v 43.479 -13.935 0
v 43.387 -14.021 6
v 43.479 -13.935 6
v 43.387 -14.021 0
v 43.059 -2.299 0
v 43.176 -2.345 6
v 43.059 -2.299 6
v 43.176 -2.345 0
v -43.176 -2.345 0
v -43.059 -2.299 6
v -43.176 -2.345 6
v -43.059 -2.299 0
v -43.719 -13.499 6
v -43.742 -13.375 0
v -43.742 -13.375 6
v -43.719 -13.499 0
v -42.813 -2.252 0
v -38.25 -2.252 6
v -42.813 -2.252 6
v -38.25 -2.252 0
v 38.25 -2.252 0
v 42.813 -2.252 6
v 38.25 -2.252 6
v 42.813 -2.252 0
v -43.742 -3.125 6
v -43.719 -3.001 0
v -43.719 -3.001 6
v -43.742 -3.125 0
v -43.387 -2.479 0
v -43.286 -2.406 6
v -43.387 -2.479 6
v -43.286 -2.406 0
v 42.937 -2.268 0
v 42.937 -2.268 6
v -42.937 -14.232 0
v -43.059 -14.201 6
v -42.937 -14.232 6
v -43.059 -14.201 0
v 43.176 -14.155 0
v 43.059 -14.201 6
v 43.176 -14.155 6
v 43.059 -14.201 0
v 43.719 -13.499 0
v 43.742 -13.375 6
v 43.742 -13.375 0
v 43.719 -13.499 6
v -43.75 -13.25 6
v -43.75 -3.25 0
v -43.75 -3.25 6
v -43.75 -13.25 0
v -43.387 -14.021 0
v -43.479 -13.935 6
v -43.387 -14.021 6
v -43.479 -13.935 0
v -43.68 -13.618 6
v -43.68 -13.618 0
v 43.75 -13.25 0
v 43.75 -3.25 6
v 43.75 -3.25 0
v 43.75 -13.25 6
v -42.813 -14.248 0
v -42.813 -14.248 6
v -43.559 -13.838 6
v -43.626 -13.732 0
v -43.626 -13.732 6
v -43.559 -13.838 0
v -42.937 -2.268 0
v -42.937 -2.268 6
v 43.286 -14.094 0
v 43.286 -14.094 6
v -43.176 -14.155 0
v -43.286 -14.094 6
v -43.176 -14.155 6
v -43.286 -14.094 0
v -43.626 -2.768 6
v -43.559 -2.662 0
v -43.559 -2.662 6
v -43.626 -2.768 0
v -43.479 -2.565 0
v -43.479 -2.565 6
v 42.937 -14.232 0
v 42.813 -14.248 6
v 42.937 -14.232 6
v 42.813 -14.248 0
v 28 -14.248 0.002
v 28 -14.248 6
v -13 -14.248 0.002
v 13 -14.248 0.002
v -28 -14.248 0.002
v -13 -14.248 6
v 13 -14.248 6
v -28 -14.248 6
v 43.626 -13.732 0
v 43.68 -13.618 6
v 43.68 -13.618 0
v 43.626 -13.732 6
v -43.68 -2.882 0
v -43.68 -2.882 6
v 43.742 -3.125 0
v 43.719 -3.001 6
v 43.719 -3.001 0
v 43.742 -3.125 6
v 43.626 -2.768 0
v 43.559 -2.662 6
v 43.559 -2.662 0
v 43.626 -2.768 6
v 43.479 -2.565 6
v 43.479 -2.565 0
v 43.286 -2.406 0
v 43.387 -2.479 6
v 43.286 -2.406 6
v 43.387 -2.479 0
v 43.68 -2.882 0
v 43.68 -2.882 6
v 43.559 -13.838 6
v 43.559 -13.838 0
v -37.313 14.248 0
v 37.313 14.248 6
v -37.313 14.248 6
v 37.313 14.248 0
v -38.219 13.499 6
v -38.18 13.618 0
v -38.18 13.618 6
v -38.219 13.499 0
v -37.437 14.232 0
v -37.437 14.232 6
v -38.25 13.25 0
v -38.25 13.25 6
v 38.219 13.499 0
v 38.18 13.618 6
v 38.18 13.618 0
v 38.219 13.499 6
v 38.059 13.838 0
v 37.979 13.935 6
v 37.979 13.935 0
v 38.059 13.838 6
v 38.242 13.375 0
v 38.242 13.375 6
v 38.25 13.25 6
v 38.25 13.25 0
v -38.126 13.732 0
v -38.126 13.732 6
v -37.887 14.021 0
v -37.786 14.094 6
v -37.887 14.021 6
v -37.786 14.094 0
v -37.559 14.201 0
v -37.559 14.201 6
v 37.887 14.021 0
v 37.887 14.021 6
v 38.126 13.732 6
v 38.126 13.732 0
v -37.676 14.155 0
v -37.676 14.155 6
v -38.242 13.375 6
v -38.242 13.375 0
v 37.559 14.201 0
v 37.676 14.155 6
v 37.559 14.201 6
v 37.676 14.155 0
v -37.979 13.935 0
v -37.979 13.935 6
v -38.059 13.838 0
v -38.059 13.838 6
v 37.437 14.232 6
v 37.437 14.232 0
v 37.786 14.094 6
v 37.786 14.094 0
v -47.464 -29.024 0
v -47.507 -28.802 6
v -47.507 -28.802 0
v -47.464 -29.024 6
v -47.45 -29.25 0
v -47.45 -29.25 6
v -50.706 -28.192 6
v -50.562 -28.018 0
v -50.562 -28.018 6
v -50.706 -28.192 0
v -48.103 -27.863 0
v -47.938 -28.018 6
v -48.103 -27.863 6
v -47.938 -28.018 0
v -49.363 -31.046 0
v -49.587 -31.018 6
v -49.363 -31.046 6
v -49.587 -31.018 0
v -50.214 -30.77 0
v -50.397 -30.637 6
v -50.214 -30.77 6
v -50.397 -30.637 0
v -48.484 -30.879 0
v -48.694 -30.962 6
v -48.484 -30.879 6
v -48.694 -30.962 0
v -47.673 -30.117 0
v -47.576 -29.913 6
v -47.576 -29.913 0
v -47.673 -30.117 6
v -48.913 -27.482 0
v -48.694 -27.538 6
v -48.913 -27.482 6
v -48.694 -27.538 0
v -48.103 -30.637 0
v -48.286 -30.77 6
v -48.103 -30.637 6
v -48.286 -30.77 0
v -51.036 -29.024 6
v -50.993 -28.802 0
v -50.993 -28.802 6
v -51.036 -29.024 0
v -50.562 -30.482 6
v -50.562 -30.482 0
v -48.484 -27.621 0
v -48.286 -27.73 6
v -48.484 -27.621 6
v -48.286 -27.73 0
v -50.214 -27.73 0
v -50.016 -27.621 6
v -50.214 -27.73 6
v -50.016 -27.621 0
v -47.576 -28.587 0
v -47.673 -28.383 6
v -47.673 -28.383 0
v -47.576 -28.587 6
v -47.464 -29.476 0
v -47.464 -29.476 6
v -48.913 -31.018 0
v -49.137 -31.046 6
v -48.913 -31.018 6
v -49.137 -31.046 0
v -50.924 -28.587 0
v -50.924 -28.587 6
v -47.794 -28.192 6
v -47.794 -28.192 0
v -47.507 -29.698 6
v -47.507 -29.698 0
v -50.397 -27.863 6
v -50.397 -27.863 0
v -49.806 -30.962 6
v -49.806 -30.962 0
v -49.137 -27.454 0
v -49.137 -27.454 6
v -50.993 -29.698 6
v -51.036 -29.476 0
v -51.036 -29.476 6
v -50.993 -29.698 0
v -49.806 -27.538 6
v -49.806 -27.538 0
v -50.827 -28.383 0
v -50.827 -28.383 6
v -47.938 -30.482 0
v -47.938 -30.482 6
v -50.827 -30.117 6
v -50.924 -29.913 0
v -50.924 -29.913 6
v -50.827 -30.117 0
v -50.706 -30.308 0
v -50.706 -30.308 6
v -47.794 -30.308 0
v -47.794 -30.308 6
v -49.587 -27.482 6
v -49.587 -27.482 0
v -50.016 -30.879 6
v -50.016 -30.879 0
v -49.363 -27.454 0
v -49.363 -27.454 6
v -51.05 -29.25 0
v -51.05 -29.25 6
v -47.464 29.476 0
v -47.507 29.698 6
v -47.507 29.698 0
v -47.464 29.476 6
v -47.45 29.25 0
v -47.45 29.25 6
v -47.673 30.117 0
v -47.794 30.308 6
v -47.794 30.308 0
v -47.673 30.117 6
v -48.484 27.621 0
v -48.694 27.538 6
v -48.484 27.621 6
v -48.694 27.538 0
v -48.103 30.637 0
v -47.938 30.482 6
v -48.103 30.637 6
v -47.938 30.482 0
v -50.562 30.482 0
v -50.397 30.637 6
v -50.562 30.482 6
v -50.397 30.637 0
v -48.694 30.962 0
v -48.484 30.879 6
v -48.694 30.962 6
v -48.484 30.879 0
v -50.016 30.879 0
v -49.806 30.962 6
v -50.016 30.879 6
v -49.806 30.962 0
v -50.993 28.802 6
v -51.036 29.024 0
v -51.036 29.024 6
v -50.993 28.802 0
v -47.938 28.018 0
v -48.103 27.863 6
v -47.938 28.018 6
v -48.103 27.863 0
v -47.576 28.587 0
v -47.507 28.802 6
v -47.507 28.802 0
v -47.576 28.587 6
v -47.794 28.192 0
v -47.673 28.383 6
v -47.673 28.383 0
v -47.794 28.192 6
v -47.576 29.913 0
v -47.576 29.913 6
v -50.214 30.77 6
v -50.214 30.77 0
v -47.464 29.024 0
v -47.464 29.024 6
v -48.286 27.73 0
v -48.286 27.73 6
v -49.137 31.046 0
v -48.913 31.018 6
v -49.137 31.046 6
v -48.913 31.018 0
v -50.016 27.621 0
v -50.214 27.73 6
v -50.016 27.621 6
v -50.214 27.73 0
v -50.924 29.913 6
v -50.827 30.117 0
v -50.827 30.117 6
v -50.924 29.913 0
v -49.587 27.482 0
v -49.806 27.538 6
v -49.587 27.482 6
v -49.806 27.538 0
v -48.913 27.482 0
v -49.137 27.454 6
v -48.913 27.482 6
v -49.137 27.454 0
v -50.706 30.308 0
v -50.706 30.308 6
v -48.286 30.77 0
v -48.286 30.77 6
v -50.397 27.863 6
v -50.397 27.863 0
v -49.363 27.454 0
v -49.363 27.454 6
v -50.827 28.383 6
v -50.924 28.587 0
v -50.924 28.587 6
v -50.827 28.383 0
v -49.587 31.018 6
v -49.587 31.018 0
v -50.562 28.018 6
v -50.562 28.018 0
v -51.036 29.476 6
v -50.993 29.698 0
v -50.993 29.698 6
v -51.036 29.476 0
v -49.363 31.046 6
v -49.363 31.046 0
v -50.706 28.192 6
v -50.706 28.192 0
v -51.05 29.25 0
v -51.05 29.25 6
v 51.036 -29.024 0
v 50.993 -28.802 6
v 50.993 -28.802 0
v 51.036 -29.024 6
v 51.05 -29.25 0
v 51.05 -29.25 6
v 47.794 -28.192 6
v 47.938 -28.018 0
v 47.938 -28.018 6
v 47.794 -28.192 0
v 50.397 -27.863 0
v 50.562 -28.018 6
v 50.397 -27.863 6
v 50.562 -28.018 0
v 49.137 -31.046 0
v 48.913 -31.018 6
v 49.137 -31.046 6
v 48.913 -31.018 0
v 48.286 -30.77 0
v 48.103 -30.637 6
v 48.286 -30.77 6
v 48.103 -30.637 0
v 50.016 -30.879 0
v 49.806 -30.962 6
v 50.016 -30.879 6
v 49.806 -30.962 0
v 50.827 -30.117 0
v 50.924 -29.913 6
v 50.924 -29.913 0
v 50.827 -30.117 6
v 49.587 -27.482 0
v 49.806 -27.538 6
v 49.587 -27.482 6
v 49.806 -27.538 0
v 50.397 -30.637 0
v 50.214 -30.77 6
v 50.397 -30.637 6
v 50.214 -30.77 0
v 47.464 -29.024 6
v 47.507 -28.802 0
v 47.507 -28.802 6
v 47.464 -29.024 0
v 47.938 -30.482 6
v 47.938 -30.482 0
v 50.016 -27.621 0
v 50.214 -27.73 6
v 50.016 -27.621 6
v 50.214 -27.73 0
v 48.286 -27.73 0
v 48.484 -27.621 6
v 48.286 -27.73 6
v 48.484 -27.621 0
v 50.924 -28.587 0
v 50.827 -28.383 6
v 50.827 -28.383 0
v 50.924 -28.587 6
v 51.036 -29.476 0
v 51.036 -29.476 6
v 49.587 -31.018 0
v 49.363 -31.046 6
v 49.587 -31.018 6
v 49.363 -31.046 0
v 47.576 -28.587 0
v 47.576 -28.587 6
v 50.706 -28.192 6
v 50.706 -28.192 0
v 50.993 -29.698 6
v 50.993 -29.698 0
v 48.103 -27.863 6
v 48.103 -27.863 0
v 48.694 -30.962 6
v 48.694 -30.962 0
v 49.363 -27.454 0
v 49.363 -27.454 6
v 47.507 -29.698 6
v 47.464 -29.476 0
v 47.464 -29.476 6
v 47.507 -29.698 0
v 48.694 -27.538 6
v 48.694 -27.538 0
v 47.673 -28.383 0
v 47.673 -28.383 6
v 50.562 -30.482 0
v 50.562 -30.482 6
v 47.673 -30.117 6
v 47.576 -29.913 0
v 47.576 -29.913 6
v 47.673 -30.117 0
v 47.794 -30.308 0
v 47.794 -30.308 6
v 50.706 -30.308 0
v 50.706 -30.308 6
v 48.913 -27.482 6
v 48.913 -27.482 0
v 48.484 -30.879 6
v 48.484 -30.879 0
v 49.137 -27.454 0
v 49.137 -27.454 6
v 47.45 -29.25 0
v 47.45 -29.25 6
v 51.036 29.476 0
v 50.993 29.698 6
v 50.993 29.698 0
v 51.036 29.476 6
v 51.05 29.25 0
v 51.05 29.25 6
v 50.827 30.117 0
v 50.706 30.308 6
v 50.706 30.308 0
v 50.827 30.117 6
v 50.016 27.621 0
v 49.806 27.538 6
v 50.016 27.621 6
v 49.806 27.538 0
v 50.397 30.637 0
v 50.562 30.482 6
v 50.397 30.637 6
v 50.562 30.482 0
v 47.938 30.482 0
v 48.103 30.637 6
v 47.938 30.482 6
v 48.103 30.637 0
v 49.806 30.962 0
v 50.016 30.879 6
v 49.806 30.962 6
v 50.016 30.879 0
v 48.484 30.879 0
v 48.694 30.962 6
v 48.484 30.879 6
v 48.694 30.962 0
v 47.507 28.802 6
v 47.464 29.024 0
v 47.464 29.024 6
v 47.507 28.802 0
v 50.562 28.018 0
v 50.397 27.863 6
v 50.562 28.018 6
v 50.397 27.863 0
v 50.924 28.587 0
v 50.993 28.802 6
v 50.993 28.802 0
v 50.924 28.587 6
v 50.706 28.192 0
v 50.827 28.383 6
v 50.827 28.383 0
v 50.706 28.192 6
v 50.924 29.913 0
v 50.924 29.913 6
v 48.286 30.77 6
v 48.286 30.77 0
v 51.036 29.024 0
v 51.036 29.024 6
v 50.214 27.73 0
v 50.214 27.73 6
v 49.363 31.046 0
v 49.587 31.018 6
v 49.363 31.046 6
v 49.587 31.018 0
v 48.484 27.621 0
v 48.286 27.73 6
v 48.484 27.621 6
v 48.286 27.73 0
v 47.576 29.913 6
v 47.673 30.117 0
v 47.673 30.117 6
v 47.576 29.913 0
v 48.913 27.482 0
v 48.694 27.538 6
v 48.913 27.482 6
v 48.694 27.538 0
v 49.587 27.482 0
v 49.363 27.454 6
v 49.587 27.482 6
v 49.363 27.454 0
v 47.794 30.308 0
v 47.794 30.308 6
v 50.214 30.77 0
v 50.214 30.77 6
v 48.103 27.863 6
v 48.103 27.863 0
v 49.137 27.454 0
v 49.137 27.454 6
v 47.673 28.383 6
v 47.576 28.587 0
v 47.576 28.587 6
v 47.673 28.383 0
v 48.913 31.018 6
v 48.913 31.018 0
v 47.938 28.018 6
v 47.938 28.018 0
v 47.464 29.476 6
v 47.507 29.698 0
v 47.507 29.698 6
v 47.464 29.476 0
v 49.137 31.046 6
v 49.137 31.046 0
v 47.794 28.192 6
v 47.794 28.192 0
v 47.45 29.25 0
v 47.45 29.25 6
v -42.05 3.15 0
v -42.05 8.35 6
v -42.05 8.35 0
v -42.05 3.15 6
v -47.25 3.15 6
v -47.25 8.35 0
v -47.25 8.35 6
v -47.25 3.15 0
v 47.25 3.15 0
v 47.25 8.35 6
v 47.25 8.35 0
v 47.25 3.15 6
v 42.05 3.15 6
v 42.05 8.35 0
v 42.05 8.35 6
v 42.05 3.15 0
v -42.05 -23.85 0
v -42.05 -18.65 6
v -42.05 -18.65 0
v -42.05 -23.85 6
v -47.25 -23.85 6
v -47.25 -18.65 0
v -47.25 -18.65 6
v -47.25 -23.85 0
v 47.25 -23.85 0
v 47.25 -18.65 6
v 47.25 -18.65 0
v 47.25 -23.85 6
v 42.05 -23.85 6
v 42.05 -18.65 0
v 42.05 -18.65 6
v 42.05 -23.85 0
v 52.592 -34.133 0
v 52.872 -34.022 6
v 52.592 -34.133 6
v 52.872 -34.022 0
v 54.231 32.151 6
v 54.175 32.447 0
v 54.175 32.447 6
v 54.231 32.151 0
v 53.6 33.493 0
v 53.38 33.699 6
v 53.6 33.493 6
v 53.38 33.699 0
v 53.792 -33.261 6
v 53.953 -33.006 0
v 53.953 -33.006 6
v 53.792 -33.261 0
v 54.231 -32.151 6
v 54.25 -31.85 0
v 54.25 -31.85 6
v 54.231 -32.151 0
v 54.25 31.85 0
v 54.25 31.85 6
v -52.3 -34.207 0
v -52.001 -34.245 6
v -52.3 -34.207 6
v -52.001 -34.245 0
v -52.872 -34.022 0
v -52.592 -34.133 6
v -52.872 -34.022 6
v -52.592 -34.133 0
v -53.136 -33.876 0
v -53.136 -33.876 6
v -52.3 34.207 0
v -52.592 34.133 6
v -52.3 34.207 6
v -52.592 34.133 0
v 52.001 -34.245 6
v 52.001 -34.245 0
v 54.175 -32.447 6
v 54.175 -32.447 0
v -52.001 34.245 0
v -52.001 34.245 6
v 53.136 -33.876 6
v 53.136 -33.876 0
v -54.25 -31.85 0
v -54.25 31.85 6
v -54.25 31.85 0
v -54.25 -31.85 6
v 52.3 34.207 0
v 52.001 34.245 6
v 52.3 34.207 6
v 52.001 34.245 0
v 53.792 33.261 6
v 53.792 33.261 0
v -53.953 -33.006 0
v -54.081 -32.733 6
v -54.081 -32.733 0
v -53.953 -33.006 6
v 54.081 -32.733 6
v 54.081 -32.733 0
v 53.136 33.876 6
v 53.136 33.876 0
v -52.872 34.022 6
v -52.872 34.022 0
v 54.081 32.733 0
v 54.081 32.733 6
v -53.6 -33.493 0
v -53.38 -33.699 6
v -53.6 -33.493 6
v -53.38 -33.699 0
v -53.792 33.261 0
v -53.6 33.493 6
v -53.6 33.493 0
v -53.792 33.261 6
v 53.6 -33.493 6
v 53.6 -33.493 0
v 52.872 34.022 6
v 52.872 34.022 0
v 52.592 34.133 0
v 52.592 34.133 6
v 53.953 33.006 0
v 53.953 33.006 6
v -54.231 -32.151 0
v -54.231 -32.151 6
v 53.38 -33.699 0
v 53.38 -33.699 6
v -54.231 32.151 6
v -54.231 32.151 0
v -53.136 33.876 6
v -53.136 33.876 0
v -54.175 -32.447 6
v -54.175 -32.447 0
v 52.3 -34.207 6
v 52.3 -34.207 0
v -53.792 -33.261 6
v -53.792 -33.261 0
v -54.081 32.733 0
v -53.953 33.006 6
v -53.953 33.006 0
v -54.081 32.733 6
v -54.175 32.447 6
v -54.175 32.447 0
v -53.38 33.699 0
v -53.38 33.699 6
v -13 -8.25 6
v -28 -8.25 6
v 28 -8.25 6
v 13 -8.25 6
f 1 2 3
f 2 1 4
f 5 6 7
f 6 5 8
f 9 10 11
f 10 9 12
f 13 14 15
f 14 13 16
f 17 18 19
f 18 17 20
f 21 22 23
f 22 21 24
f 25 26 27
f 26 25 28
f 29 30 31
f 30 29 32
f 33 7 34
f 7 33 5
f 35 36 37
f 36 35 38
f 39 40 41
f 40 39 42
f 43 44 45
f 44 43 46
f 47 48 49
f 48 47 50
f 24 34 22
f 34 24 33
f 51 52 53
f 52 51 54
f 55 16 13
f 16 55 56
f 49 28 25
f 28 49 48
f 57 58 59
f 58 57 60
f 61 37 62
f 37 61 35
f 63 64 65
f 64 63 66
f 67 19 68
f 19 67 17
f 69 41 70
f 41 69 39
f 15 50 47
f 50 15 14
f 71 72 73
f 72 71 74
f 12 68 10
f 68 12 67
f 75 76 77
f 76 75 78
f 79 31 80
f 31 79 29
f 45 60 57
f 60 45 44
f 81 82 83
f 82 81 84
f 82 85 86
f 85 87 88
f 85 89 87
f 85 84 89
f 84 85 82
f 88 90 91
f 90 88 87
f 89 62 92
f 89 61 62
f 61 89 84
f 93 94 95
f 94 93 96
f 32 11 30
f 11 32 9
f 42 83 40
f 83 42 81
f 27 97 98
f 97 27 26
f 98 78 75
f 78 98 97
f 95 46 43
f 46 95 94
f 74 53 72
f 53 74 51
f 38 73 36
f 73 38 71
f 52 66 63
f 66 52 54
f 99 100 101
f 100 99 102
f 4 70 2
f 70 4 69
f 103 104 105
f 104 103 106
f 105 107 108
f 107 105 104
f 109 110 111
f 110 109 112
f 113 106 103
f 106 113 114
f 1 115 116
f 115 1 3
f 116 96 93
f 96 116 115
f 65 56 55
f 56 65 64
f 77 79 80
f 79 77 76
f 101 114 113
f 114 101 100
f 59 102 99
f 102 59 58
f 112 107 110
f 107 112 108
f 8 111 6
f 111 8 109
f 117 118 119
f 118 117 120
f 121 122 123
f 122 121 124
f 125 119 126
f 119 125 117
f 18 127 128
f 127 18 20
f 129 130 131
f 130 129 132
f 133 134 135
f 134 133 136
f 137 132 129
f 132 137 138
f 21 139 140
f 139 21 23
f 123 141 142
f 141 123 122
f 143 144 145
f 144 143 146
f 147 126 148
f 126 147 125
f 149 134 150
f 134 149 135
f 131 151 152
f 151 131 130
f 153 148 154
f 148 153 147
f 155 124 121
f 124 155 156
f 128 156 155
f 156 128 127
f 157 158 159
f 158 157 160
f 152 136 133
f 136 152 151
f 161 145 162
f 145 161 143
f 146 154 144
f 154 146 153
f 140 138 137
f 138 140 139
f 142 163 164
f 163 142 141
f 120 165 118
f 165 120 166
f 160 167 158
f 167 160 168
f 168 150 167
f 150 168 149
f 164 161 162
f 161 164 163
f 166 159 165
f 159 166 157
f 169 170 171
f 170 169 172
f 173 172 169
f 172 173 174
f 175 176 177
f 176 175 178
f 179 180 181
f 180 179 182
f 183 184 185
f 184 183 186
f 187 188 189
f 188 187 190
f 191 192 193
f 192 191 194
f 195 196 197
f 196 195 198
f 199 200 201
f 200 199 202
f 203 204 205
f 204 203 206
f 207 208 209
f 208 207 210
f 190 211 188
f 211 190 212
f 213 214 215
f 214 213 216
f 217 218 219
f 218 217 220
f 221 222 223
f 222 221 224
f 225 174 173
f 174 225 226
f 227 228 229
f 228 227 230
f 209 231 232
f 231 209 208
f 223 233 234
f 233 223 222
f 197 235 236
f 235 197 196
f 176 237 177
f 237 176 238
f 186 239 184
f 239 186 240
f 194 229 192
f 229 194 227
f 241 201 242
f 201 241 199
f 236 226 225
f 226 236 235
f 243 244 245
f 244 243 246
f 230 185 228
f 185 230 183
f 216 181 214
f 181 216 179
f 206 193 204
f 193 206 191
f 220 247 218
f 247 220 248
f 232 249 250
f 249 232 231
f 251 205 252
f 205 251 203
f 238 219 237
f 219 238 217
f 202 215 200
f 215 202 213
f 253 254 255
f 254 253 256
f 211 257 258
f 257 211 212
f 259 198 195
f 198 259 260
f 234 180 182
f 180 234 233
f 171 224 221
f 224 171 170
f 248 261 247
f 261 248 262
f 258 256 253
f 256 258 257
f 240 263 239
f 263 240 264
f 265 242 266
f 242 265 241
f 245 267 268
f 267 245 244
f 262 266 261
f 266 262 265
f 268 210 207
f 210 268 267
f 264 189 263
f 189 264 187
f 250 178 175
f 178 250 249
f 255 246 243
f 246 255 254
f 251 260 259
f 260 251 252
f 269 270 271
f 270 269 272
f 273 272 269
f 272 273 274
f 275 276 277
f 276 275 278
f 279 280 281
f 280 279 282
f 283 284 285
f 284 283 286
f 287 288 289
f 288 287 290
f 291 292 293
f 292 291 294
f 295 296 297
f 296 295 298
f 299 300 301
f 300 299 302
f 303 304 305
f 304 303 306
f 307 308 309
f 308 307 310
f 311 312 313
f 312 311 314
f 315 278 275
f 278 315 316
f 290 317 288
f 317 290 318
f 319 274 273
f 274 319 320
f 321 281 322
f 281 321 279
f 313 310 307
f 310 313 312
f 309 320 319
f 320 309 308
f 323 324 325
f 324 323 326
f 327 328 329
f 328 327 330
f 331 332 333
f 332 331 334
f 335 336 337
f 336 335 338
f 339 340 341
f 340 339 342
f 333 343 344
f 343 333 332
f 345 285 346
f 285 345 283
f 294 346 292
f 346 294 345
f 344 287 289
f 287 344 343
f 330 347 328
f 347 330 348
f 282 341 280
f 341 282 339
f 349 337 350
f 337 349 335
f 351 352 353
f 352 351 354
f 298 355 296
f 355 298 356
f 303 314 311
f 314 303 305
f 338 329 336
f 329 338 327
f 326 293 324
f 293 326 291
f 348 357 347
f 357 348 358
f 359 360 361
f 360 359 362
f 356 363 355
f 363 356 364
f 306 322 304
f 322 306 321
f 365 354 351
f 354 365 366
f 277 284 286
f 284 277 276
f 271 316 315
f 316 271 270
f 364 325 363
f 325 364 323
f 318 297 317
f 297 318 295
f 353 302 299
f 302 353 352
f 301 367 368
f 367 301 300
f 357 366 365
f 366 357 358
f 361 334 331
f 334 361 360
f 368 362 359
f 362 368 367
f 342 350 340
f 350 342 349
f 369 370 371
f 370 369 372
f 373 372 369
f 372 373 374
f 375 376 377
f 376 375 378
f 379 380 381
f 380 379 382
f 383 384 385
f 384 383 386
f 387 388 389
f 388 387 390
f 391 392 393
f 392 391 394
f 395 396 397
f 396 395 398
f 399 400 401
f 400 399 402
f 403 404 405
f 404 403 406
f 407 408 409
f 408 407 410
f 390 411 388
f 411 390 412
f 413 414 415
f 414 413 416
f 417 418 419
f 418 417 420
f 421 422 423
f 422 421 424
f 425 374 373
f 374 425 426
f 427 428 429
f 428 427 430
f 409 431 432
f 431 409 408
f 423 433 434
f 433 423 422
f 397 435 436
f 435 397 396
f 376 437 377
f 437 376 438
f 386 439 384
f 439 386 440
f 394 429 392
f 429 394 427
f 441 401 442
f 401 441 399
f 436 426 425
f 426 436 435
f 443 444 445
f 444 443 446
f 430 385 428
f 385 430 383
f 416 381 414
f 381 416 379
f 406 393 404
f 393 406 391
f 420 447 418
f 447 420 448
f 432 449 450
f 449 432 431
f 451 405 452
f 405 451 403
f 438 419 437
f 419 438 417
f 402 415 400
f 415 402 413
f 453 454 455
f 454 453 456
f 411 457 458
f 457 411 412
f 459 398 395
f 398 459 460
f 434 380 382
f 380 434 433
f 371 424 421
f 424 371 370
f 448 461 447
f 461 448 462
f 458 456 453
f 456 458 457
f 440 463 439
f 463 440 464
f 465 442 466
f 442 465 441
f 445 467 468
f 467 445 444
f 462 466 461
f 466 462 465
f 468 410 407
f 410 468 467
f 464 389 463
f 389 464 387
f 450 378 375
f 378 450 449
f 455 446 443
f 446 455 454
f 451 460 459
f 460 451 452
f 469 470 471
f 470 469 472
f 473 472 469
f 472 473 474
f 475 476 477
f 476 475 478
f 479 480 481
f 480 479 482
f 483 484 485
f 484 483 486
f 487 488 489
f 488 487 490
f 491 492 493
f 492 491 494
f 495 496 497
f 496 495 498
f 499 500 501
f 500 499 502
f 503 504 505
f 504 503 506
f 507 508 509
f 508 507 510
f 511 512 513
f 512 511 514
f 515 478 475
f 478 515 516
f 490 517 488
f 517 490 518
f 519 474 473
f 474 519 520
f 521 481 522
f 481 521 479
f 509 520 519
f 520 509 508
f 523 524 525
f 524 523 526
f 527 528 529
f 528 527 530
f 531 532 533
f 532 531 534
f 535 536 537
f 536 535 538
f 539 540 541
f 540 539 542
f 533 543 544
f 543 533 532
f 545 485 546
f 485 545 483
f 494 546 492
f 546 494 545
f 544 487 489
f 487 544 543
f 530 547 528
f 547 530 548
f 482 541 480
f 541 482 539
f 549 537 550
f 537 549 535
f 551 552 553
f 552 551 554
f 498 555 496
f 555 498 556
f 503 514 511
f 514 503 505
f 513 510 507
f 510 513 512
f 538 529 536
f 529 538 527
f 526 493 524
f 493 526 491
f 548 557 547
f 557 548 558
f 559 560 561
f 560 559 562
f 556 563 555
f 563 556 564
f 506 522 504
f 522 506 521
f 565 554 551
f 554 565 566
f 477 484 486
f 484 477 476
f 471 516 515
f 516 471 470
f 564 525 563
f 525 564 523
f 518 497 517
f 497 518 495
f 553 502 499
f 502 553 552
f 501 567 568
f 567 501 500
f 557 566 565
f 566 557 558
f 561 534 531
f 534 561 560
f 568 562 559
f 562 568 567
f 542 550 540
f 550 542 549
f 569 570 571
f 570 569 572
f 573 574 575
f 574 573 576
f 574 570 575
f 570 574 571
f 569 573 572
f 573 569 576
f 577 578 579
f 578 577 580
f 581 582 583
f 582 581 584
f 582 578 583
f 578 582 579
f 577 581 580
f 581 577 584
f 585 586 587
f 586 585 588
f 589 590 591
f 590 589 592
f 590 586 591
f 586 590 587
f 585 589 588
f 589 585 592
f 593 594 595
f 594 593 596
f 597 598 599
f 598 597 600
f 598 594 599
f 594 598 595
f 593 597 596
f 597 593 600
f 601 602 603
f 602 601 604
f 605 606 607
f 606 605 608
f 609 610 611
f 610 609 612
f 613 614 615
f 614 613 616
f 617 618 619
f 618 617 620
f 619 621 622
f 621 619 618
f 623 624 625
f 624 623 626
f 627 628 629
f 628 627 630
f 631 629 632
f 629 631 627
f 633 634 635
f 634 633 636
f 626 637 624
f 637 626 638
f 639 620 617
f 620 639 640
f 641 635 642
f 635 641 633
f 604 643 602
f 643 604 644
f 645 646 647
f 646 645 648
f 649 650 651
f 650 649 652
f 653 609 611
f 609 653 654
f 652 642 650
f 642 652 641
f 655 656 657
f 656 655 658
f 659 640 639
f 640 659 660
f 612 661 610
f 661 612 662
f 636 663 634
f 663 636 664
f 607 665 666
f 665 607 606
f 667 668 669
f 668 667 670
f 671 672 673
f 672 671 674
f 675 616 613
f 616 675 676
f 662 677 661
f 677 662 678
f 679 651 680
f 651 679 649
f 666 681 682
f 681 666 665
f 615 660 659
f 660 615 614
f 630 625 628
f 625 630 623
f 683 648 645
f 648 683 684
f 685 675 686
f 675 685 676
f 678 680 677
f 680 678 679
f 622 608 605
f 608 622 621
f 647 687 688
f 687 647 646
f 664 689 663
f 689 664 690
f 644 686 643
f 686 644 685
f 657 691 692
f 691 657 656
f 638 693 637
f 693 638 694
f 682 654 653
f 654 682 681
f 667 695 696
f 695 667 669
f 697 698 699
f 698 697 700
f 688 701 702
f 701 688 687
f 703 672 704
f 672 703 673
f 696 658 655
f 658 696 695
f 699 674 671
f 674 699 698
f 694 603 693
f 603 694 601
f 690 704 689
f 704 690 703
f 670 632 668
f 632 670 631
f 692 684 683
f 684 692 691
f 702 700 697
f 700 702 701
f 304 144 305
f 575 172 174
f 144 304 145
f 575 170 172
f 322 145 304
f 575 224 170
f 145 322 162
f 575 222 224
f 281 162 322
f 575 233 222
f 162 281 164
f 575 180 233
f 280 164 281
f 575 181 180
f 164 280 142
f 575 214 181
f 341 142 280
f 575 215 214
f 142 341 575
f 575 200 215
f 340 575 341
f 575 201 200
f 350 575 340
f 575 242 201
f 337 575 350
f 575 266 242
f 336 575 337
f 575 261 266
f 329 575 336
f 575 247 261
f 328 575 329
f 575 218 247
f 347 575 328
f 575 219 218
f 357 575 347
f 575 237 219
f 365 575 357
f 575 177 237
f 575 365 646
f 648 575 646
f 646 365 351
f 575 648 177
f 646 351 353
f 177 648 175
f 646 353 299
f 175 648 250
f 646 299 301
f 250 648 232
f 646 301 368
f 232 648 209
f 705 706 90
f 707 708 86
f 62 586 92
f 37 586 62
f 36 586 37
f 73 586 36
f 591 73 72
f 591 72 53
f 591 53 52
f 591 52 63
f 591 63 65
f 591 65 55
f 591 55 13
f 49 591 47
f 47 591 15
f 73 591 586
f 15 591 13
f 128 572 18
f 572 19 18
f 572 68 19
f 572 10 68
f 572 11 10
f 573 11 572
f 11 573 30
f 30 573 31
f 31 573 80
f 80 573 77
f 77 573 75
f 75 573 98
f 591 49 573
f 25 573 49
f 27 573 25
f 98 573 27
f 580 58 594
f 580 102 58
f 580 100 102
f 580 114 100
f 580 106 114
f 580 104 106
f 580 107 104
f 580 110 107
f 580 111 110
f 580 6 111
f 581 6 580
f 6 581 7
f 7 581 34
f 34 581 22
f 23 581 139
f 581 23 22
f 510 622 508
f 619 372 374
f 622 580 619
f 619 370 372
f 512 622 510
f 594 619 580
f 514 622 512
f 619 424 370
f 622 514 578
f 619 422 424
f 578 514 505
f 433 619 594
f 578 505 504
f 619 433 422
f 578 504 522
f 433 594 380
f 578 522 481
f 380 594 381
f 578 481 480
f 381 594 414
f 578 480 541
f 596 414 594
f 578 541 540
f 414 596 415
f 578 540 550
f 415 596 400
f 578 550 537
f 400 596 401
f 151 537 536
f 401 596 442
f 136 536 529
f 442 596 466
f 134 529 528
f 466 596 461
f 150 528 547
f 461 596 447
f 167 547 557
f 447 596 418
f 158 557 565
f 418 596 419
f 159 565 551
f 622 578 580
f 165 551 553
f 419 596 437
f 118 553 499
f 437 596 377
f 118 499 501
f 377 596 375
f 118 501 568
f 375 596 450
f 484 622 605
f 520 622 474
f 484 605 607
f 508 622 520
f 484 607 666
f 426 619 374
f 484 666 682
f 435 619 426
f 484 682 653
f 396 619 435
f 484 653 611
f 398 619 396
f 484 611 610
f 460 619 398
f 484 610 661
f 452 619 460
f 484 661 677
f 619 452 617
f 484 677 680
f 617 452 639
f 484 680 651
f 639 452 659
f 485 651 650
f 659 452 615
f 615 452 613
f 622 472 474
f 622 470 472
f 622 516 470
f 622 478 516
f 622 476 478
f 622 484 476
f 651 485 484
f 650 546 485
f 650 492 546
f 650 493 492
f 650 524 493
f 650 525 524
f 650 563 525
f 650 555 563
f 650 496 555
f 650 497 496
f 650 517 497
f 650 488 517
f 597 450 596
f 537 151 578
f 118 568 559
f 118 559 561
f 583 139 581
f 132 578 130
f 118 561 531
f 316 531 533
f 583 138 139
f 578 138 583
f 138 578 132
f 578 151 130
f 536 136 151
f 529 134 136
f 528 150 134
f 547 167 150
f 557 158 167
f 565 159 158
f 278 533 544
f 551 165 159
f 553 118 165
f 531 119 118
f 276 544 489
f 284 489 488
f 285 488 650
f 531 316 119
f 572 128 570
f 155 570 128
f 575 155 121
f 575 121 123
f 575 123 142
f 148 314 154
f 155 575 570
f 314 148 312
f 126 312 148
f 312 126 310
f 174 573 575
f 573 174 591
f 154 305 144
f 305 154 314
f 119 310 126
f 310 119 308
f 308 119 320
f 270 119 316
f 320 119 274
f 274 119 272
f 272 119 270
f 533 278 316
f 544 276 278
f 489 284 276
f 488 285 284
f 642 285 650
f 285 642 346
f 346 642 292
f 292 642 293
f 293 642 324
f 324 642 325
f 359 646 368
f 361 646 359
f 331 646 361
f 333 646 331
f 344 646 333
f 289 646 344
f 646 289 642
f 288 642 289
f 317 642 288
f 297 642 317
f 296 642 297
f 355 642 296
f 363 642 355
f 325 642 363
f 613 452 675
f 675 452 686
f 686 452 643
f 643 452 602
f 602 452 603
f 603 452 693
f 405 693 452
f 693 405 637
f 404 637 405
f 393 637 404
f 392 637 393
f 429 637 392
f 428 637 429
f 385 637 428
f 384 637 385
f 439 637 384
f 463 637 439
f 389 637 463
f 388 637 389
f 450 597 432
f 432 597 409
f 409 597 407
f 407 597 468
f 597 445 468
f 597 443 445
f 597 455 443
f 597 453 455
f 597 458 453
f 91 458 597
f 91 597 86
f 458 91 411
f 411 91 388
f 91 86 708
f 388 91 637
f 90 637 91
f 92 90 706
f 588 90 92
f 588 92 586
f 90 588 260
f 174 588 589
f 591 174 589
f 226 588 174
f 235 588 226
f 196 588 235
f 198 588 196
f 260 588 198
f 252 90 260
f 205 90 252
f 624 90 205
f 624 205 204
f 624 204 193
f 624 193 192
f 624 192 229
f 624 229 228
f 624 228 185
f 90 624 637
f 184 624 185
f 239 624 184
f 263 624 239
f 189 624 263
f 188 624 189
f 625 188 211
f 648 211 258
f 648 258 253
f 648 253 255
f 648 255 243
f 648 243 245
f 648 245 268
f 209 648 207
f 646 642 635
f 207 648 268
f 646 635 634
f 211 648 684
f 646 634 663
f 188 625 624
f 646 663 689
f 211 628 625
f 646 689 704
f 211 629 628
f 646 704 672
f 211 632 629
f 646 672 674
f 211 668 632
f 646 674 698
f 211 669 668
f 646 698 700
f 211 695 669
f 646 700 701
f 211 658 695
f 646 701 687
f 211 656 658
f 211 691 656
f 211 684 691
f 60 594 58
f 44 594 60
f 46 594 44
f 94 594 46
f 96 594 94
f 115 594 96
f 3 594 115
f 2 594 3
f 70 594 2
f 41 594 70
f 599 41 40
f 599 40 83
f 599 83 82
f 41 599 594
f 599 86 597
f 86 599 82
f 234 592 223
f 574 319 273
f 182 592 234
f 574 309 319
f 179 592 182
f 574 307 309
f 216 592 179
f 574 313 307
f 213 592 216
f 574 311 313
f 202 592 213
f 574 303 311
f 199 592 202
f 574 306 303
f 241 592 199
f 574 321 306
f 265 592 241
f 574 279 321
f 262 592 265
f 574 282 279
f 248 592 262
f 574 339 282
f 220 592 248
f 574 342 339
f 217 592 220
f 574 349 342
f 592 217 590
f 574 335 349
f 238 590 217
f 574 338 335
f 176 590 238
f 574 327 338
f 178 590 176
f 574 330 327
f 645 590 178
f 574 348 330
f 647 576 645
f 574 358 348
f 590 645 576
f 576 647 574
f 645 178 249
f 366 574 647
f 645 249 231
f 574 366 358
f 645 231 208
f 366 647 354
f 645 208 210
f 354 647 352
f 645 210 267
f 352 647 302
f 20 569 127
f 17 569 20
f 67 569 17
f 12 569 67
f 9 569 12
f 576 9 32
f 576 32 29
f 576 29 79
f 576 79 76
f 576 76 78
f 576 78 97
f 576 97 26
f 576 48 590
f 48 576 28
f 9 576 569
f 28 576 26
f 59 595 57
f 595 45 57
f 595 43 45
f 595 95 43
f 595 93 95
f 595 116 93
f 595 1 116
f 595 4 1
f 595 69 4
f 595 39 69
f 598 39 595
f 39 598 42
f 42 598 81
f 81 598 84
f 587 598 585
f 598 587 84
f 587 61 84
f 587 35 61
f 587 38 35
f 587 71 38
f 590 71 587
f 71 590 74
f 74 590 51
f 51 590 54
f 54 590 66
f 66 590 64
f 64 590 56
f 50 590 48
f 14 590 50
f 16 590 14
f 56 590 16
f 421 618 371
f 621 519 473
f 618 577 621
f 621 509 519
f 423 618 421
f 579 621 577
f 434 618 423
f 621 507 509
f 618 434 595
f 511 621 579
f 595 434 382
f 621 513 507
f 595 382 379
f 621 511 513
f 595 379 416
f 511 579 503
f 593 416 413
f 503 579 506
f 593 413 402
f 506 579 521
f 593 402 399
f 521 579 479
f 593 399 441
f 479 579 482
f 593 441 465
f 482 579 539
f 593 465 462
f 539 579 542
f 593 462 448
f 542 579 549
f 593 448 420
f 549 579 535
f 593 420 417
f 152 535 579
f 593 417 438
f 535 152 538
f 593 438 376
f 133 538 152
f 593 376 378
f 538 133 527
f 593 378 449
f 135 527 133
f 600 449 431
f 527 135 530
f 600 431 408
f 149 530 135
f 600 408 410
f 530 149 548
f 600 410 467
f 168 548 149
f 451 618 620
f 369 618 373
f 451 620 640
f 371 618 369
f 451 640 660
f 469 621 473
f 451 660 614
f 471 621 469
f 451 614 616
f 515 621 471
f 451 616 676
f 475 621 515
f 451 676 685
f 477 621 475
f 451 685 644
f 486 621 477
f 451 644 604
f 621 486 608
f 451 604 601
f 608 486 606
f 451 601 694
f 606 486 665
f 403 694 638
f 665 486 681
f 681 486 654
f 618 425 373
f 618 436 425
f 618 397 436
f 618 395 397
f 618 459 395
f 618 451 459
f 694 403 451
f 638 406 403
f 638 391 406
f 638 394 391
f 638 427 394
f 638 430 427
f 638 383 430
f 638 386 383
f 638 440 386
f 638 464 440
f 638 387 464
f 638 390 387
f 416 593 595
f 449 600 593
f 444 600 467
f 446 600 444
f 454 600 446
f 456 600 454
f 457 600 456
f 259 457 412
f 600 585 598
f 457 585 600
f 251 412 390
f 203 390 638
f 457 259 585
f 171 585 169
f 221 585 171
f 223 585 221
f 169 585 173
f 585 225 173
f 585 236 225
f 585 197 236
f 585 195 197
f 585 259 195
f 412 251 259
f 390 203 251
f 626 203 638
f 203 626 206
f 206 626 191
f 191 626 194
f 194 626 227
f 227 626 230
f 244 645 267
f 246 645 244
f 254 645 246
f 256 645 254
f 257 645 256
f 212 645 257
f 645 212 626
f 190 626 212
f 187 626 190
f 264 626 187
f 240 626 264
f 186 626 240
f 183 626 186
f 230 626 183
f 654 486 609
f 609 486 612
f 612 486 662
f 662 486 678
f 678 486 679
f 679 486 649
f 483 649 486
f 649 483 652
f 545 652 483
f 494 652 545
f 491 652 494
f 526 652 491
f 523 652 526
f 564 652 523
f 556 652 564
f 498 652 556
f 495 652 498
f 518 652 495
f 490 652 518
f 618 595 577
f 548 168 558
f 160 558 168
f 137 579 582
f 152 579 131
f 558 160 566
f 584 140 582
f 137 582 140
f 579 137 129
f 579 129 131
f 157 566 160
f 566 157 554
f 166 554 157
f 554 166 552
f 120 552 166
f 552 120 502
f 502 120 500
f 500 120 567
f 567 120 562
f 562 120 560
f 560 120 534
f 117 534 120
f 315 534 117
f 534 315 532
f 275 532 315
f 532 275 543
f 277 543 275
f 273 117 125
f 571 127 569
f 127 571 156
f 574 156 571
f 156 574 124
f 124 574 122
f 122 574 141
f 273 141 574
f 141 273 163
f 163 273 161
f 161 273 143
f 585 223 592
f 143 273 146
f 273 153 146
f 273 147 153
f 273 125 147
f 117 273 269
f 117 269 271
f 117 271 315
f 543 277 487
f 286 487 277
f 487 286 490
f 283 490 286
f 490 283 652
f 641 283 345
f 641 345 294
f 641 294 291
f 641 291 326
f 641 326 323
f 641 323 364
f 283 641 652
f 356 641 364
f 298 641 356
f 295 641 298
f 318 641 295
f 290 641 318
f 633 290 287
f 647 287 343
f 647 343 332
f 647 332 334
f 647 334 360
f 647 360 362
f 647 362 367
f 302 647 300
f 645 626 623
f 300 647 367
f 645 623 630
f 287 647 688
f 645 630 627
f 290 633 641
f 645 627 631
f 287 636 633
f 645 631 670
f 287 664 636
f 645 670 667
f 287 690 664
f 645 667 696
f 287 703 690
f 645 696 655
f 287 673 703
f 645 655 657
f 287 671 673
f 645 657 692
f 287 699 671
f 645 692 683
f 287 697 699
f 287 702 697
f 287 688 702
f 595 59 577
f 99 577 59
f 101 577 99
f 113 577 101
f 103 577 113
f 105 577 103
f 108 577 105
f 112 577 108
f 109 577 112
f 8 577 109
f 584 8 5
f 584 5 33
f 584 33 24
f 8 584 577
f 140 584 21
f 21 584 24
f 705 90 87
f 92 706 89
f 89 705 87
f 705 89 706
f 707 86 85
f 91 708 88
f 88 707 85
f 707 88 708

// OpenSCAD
$fn = 50;

difference() {
	union() {
		translate(v = [0, 0, 0]) {
			rotate(a = [0, 0, 0]) {
				difference() {
					union() {
						translate(v = [0, 0, 0]) {
							rotate(a = [0, 0, 0]) {
								difference() {
									union() {
										hull() {
											translate(v = [-51.85, 31.85, 0]) {
												cylinder(h = 6.0, r = 2.4);
											}
											translate(v = [51.85, 31.85, 0]) {
												cylinder(h = 6.0, r = 2.4);
											}
											translate(v = [-51.85, -31.85, 0]) {
												cylinder(h = 6.0, r = 2.4);
											}
											translate(v = [51.85, -31.85, 0]) {
												cylinder(h = 6.0, r = 2.4);
											}
										}
									}
									union() {
										translate(v = [0.0, -8.25, -0.1]) {
											hull() {
												translate(v = [-42.75, 5.0, 0]) {
													cylinder(h = 18.2, r = 1.0);
												}
												translate(v = [42.75, 5.0, 0]) {
													cylinder(h = 18.2, r = 1.0);
												}
												translate(v = [-42.75, -5.0, 0]) {
													cylinder(h = 18.2, r = 1.0);
												}
												translate(v = [42.75, -5.0, 0]) {
													cylinder(h = 18.2, r = 1.0);
												}
											}
										}
										translate(v = [0.0, 0.0, -0.1]) {
											hull() {
												translate(v = [-37.25, 13.25, 0]) {
													cylinder(h = 18.2, r = 1.0);
												}
												translate(v = [37.25, 13.25, 0]) {
													cylinder(h = 18.2, r = 1.0);
												}
												translate(v = [-37.25, -13.25, 0]) {
													cylinder(h = 18.2, r = 1.0);
												}
												translate(v = [37.25, -13.25, 0]) {
													cylinder(h = 18.2, r = 1.0);
												}
											}
										}
										translate(v = [-49.25, -29.25, -0.1]) {
											cylinder(h = 6.2, r = 1.8);
										}
										translate(v = [-49.25, 29.25, -0.1]) {
											cylinder(h = 6.2, r = 1.8);
										}
										translate(v = [49.25, -29.25, -0.1]) {
											cylinder(h = 6.2, r = 1.8);
										}
										translate(v = [49.25, 29.25, -0.1]) {
											cylinder(h = 6.2, r = 1.8);
										}
										translate(v = [-47.25, 3.15, -0.1]) {
											cube(size = [5.2, 5.2, 6.2]);
										}
										translate(v = [42.05, 3.15, -0.1]) {
											cube(size = [5.2, 5.2, 6.2]);
										}
										translate(v = [-47.25, -23.85, -0.1]) {
											cube(size = [5.2, 5.2, 6.2]);
										}
										translate(v = [42.05, -23.85, -0.1]) {
											cube(size = [5.2, 5.2, 6.2]);
										}
									}
								}
							}
						}
						translate(v = [0, 0, 0]) {
							rotate(a = [0, 0, 0]) {
								difference() {
									union() {
										translate(v = [-28.0, -16.05, 0]) {
											cube(size = [15.0, 7.8, 6.0]);
										}
									}
									union() {
										translate(v = [-28.1, -16.05, 0]) {
											rotate(a = [90, 0, 90]) {
												linear_extrude(height = 15.2) {
													polygon(points = [[1.6999999999999997, -0.1], [7.8999999999999995, -0.1], [7.8999999999999995, 6.1]]);
												}
											}
										}
									}
								}
							}
						}
						translate(v = [0, 0, 0]) {
							rotate(a = [0, 0, 0]) {
								difference() {
									union() {
										translate(v = [13.0, -16.05, 0]) {
											cube(size = [15.0, 7.8, 6.0]);
										}
									}
									union() {
										translate(v = [12.9, -16.05, 0]) {
											rotate(a = [90, 0, 90]) {
												linear_extrude(height = 15.2) {
													polygon(points = [[1.6999999999999997, -0.1], [7.8999999999999995, -0.1], [7.8999999999999995, 6.1]]);
												}
											}
										}
									}
								}
							}
						}
					}
					union();
				}
			}
		}
	}
	union();
}
